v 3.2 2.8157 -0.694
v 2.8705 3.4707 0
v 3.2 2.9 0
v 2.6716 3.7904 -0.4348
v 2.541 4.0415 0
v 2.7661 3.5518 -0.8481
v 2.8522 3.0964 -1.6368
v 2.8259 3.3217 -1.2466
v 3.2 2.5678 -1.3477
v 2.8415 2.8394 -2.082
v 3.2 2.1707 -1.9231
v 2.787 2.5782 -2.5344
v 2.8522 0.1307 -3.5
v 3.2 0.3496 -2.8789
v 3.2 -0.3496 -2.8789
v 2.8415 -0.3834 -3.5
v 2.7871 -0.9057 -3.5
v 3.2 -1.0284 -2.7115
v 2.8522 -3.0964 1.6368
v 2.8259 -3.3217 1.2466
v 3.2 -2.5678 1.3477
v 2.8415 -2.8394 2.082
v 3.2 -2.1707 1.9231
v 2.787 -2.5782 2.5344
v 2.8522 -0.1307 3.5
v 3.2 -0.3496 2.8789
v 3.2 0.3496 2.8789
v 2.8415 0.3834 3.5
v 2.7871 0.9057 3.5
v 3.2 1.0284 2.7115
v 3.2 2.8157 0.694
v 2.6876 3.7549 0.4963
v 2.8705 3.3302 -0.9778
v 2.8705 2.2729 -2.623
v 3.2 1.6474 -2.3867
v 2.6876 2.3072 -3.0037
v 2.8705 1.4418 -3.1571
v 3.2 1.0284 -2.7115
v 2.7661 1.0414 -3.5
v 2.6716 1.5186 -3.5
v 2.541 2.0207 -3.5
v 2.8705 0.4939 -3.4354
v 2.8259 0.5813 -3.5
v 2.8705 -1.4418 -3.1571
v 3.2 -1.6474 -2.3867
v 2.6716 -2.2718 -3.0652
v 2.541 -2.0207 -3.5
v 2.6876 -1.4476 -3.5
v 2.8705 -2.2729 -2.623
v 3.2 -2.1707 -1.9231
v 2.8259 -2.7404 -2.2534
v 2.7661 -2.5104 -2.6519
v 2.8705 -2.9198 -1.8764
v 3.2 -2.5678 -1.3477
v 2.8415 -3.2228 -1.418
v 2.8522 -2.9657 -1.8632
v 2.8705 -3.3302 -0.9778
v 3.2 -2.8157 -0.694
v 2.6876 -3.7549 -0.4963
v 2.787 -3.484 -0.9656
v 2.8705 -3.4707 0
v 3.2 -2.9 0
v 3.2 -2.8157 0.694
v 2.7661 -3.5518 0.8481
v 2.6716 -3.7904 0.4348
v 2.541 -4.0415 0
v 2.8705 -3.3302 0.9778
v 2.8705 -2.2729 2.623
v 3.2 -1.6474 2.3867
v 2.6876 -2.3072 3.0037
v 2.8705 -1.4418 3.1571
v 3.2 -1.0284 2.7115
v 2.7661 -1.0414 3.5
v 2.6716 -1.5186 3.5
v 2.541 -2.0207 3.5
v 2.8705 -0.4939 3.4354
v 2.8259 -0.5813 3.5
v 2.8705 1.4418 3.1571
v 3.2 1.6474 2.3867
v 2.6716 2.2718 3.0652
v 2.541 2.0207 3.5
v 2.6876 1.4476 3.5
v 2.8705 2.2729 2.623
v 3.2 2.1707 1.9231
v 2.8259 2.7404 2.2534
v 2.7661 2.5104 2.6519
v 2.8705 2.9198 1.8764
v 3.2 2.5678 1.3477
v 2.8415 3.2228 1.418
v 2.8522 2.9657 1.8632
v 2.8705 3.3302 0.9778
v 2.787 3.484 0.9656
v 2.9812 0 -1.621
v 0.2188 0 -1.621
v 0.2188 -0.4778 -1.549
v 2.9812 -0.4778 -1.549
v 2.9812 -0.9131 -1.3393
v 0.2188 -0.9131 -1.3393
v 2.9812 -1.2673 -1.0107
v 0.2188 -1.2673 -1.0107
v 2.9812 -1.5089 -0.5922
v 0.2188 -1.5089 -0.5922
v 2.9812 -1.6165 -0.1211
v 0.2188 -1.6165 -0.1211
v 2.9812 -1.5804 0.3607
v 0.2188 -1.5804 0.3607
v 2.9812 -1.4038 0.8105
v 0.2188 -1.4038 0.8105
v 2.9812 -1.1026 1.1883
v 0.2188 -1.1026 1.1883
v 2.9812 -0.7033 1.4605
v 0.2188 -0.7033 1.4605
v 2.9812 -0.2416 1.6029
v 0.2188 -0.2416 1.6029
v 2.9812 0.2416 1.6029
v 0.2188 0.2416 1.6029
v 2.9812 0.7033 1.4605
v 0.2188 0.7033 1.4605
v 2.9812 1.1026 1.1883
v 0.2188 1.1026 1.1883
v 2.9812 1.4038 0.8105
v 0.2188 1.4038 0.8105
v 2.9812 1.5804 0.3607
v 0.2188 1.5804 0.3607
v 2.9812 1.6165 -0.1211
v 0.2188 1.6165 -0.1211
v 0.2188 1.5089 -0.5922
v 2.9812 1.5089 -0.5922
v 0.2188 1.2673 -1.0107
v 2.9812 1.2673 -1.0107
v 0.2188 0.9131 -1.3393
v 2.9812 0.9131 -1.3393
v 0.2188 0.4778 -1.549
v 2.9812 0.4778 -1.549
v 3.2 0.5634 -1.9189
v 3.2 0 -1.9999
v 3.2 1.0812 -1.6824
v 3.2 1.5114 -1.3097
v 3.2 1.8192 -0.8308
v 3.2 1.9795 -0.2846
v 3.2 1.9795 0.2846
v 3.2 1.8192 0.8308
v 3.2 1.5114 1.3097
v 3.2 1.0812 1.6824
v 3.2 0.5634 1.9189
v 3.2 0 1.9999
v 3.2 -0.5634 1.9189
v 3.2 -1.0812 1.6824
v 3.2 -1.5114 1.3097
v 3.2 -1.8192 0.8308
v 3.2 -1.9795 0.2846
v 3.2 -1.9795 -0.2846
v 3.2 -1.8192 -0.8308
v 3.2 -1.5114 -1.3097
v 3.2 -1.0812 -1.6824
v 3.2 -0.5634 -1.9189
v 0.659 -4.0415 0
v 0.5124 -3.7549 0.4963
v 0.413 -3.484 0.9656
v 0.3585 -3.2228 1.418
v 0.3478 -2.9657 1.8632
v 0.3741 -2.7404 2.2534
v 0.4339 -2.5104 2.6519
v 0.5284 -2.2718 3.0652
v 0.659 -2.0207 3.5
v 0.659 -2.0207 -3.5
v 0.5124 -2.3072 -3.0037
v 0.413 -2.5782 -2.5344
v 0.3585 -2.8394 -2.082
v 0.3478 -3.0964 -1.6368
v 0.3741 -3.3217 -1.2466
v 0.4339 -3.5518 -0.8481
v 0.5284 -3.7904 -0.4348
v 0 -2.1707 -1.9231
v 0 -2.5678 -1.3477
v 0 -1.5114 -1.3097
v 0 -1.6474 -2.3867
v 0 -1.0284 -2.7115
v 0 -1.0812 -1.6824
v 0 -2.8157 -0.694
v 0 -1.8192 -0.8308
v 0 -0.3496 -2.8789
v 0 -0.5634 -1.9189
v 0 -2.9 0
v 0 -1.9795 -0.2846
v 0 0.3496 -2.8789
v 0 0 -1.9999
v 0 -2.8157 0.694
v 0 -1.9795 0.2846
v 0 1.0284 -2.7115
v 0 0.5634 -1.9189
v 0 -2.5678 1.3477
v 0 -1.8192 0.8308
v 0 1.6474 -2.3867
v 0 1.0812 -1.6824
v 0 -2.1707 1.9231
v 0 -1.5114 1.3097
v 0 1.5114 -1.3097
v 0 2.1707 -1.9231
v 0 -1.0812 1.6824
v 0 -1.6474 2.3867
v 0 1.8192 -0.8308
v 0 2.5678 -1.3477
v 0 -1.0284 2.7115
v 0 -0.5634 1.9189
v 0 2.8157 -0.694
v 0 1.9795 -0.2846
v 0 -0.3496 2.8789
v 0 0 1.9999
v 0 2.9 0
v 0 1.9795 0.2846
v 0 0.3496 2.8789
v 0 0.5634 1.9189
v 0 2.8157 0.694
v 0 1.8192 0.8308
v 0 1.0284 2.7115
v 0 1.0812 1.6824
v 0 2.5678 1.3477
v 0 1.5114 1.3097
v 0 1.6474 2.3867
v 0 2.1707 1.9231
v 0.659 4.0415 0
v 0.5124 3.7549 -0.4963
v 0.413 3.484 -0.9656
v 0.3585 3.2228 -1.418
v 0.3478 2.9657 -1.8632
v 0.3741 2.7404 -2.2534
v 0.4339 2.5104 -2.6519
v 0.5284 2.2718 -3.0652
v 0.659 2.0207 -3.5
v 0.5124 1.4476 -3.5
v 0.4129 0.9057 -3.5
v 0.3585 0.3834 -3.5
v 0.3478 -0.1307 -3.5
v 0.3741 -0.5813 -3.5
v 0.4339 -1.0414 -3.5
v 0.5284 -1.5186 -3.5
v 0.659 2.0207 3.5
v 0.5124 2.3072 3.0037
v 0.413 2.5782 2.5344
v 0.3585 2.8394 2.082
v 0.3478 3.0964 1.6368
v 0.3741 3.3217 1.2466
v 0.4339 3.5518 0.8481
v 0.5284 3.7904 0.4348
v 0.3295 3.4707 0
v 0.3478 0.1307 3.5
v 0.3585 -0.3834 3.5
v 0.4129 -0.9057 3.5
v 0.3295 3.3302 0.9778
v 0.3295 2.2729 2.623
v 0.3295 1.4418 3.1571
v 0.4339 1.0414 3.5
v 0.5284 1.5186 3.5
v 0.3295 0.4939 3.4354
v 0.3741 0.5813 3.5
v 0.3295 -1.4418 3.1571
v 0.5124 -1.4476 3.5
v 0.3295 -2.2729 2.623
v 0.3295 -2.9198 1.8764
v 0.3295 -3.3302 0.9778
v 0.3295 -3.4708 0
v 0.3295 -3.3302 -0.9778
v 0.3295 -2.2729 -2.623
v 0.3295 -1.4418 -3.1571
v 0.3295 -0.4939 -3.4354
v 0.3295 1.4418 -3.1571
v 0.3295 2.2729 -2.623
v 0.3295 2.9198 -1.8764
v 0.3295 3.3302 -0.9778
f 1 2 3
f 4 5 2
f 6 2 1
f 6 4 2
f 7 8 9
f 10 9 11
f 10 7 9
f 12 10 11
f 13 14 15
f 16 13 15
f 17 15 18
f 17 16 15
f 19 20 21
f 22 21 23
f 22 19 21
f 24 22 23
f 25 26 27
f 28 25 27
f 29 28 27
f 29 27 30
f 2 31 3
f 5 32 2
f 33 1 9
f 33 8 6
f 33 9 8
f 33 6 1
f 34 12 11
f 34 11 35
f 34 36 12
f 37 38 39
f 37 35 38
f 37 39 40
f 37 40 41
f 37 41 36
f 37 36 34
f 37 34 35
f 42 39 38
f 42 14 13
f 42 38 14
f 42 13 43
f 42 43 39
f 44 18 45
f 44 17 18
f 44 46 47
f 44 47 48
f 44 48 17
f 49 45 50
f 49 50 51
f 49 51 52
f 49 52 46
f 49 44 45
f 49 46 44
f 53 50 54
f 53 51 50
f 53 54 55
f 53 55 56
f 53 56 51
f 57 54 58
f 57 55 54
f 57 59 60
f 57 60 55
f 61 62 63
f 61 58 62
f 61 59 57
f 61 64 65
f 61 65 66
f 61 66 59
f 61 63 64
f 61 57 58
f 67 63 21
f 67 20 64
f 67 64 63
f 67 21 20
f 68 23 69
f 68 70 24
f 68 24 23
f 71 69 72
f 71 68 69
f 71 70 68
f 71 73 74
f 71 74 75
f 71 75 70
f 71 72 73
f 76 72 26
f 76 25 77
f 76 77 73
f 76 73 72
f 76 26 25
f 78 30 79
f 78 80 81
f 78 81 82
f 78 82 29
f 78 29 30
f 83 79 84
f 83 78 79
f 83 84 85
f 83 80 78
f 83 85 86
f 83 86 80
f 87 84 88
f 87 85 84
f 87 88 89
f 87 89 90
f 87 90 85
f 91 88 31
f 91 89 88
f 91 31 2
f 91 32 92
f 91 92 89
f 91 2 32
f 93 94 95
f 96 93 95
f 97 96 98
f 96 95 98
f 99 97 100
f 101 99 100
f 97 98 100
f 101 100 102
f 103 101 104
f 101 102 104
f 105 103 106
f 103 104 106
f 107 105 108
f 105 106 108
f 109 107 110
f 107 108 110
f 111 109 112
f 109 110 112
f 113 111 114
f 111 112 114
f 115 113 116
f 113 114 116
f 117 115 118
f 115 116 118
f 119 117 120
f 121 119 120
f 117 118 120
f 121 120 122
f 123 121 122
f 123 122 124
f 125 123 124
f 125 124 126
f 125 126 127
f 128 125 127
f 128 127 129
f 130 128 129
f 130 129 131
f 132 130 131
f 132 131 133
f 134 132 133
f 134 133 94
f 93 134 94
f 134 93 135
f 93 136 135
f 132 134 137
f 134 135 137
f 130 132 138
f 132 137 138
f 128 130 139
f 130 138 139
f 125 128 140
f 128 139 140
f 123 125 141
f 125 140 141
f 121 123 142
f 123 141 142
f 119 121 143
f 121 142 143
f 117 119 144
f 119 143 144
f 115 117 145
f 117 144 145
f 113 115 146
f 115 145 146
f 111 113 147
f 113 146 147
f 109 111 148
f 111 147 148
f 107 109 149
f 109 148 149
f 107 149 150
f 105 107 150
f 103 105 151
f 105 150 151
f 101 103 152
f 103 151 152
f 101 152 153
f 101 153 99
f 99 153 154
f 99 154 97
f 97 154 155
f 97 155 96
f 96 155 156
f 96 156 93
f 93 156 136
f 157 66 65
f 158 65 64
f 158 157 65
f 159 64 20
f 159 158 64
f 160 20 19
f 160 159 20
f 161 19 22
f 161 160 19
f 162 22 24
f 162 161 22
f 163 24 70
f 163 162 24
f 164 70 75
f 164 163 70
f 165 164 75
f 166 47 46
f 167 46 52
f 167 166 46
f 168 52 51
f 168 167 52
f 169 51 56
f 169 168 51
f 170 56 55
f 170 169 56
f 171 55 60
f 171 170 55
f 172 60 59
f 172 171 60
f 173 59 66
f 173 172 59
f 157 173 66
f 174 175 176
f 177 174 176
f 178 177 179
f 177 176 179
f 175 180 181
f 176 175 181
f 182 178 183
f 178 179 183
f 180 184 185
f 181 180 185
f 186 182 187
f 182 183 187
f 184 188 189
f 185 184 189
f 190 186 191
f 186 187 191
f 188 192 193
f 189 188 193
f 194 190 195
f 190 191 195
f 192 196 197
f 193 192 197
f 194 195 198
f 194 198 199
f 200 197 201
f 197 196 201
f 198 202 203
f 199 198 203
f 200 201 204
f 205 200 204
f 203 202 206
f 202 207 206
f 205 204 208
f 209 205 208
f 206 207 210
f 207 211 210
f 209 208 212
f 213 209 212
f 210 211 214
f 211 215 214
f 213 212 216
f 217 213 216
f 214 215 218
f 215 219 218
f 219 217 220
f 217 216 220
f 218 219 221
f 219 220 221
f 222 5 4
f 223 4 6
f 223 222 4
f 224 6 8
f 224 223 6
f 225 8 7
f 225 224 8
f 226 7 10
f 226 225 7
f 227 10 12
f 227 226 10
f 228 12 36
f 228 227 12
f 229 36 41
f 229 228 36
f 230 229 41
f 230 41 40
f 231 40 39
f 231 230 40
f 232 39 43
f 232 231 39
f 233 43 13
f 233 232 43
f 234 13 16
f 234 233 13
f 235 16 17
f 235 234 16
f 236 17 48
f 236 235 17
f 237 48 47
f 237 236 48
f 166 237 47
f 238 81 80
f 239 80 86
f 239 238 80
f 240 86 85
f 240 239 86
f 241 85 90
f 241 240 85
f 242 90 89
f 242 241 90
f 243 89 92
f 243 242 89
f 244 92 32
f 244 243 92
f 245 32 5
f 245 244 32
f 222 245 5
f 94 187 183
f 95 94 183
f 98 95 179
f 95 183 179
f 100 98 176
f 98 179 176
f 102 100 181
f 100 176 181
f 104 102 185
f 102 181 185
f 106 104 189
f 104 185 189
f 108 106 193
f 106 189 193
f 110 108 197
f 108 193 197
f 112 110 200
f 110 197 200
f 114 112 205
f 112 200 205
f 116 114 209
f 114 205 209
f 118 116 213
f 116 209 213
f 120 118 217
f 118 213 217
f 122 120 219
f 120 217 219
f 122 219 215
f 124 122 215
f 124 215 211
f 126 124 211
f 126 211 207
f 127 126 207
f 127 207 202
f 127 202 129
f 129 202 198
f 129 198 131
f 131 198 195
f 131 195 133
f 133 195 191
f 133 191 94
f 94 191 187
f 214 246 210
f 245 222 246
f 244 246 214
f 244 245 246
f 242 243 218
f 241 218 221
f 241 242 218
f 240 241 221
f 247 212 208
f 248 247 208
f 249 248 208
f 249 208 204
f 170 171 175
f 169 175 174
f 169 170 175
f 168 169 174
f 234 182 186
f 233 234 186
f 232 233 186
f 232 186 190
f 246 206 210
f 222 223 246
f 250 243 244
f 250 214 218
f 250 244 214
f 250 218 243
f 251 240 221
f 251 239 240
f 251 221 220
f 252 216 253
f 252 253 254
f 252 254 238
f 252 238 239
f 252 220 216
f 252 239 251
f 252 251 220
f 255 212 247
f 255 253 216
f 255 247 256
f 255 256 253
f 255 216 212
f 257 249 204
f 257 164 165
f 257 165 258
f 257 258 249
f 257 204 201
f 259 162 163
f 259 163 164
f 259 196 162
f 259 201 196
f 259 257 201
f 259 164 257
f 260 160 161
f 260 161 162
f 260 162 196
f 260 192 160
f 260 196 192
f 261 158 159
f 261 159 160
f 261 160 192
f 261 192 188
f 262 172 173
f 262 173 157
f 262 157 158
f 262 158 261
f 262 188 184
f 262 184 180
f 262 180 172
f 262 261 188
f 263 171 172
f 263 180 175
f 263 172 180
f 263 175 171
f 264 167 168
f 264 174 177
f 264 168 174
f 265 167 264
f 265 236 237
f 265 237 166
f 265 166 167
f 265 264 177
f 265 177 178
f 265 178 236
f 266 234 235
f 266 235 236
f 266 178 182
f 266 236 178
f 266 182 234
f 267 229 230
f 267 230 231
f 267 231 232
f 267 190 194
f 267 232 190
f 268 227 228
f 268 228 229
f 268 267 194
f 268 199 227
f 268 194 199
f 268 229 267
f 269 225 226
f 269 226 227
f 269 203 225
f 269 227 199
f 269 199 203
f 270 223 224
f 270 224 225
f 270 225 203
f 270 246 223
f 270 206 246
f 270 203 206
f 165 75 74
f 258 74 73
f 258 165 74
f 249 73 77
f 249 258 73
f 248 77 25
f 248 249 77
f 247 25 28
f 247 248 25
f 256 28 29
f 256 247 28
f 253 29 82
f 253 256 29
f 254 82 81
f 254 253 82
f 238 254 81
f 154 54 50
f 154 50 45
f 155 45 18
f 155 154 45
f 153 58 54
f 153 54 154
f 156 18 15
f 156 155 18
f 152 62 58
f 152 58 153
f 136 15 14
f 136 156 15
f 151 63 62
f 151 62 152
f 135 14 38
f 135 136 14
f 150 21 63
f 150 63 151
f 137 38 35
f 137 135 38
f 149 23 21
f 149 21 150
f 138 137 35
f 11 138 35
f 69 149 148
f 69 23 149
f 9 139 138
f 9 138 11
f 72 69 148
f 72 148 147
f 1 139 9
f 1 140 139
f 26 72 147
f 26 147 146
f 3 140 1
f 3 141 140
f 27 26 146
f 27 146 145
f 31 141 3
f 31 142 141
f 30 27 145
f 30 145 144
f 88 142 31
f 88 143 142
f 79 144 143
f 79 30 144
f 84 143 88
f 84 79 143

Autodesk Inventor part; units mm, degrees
ref_plane "YZ Plane" through (0, 0, 0) normal (1, 0, 0) x (0, 1, 0)
ref_plane "XZ Plane" through (0, 0, 0) normal (0, 1, 0) x (-1, 0, 0)
sketch "Esquisse1" plane through (0, 0, 0) normal (1, 0, 0) x (0, 1, 0)
  line L0 (-4.0415, 0) -> (-2.0207, 3.5)
  line L1 (-2.0207, 3.5) -> (2.0207, 3.5)
  line L2 (2.0207, 3.5) -> (4.0415, 0)
  line L3 (4.0415, 0) -> (2.0207, -3.5)
  line L4 (2.0207, -3.5) -> (-2.0207, -3.5)
  line L5 (-2.0207, -3.5) -> (-4.0415, 0)
  point P0 (0, 0)
  point P1 (0, 0)
  dimension "d0" = 8.0829
extrude "Corps" add sketch "Esquisse1" along normal blind 3.2
sketch "Esquisse2" plane through (0, 0, 0) normal (0, 0, 1) x (1, 0, 0)
  line L0 (0, 2.0207) -> (0, 4.0415) projected
  line L1 (0, 4.0415) -> (3.2, 4.0415) projected
  line L2 (3.2, 2.0207) -> (3.2, 4.0415) projected
  line L3 (-0.64, 0) -> (3.84, 0) projected
  line L4 (0.659, 4.0415) -> (0, 2.9)
  line L5 (2.541, 4.0415) -> (3.2, 2.9)
  dimension "d3" = 30
  dimension "d4" = 30
  dimension "d5" = 5.8
  dimension "d6" = 5.8
revolve "Chanfrein1" cut sketch "Esquisse2" angle 360 about axis through (-10, 0, 0) along (1, 0, 0)
sketch "Esquisse3" plane through (3.2, 0, 0) normal (1, 0, 0) x (0, 0, -1)
  arc A0 (-0.625, -1.0825) -> (0.625, -1.0825) centre (0, 0) ccw projected
hole "Filetage" at (3.2, 0, 0) direction (-1, 0, 0) diameter 3.242 end through all thread size "M4x0.7" class "6H" standard "ISO Metric profile"
chamfer "Chanfrein2" distance 0.3789 angle 30 1 edges at (3.2, 0, 1.621) measured on face at (3.2, 2.4416, -0.2965)
chamfer "Chanfrein3" distance 0.3789 angle 30 1 edges at (0, 0, 1.621) measured on face at (0, 2.4416, -0.2965)
ref_plane "Work Plane1" through (-7.9612, 0, 0) normal (0, -0.866, -0.5) x (1, 0, 0)
equation "\"d0\" = 1.1547 * SW"
equation "\"d1\" = KOH"
equation "\"d3\" = ANG1"
equation "\"d4\" = ANG2"
equation "\"d5\" = SW0"
equation "\"d6\" = SW01"
equation "\"d8\" = -0.5 * GD1 + 0.5 * NND"
equation "\"d40\" = -0.5 * GD1 + 0.5 * NND"
equation "\"d10\" = -0.5 * GD1 + 0.5 * NND"
equation "\"d41\" = -0.5 * GD1 + 0.5 * NND"
equation "\"ANG1\" = 30deg"
equation "\"ANG2\" = 30deg"
equation "\"NND\" = 4"
equation "\"KOH\" = 3.2"
equation "\"SW\" = 7"
equation "\"SW0\" = SW01"
equation "\"SW01\" = 5.8"
equation "\"GUL\" = 0.541266 * PTC"
equation "\"THREADDIA\" = 4"
equation "\"TOA\" = 30deg"
equation "\"PTC\" = 0.7"
equation "\"E0\" = 1.155 * SW"
equation "\"GAL\" = 0.541266 * PTC"
equation "\"GD1\" = 3.242228"
properties part number "DIN 934 - M4" material "Acier, doux"
